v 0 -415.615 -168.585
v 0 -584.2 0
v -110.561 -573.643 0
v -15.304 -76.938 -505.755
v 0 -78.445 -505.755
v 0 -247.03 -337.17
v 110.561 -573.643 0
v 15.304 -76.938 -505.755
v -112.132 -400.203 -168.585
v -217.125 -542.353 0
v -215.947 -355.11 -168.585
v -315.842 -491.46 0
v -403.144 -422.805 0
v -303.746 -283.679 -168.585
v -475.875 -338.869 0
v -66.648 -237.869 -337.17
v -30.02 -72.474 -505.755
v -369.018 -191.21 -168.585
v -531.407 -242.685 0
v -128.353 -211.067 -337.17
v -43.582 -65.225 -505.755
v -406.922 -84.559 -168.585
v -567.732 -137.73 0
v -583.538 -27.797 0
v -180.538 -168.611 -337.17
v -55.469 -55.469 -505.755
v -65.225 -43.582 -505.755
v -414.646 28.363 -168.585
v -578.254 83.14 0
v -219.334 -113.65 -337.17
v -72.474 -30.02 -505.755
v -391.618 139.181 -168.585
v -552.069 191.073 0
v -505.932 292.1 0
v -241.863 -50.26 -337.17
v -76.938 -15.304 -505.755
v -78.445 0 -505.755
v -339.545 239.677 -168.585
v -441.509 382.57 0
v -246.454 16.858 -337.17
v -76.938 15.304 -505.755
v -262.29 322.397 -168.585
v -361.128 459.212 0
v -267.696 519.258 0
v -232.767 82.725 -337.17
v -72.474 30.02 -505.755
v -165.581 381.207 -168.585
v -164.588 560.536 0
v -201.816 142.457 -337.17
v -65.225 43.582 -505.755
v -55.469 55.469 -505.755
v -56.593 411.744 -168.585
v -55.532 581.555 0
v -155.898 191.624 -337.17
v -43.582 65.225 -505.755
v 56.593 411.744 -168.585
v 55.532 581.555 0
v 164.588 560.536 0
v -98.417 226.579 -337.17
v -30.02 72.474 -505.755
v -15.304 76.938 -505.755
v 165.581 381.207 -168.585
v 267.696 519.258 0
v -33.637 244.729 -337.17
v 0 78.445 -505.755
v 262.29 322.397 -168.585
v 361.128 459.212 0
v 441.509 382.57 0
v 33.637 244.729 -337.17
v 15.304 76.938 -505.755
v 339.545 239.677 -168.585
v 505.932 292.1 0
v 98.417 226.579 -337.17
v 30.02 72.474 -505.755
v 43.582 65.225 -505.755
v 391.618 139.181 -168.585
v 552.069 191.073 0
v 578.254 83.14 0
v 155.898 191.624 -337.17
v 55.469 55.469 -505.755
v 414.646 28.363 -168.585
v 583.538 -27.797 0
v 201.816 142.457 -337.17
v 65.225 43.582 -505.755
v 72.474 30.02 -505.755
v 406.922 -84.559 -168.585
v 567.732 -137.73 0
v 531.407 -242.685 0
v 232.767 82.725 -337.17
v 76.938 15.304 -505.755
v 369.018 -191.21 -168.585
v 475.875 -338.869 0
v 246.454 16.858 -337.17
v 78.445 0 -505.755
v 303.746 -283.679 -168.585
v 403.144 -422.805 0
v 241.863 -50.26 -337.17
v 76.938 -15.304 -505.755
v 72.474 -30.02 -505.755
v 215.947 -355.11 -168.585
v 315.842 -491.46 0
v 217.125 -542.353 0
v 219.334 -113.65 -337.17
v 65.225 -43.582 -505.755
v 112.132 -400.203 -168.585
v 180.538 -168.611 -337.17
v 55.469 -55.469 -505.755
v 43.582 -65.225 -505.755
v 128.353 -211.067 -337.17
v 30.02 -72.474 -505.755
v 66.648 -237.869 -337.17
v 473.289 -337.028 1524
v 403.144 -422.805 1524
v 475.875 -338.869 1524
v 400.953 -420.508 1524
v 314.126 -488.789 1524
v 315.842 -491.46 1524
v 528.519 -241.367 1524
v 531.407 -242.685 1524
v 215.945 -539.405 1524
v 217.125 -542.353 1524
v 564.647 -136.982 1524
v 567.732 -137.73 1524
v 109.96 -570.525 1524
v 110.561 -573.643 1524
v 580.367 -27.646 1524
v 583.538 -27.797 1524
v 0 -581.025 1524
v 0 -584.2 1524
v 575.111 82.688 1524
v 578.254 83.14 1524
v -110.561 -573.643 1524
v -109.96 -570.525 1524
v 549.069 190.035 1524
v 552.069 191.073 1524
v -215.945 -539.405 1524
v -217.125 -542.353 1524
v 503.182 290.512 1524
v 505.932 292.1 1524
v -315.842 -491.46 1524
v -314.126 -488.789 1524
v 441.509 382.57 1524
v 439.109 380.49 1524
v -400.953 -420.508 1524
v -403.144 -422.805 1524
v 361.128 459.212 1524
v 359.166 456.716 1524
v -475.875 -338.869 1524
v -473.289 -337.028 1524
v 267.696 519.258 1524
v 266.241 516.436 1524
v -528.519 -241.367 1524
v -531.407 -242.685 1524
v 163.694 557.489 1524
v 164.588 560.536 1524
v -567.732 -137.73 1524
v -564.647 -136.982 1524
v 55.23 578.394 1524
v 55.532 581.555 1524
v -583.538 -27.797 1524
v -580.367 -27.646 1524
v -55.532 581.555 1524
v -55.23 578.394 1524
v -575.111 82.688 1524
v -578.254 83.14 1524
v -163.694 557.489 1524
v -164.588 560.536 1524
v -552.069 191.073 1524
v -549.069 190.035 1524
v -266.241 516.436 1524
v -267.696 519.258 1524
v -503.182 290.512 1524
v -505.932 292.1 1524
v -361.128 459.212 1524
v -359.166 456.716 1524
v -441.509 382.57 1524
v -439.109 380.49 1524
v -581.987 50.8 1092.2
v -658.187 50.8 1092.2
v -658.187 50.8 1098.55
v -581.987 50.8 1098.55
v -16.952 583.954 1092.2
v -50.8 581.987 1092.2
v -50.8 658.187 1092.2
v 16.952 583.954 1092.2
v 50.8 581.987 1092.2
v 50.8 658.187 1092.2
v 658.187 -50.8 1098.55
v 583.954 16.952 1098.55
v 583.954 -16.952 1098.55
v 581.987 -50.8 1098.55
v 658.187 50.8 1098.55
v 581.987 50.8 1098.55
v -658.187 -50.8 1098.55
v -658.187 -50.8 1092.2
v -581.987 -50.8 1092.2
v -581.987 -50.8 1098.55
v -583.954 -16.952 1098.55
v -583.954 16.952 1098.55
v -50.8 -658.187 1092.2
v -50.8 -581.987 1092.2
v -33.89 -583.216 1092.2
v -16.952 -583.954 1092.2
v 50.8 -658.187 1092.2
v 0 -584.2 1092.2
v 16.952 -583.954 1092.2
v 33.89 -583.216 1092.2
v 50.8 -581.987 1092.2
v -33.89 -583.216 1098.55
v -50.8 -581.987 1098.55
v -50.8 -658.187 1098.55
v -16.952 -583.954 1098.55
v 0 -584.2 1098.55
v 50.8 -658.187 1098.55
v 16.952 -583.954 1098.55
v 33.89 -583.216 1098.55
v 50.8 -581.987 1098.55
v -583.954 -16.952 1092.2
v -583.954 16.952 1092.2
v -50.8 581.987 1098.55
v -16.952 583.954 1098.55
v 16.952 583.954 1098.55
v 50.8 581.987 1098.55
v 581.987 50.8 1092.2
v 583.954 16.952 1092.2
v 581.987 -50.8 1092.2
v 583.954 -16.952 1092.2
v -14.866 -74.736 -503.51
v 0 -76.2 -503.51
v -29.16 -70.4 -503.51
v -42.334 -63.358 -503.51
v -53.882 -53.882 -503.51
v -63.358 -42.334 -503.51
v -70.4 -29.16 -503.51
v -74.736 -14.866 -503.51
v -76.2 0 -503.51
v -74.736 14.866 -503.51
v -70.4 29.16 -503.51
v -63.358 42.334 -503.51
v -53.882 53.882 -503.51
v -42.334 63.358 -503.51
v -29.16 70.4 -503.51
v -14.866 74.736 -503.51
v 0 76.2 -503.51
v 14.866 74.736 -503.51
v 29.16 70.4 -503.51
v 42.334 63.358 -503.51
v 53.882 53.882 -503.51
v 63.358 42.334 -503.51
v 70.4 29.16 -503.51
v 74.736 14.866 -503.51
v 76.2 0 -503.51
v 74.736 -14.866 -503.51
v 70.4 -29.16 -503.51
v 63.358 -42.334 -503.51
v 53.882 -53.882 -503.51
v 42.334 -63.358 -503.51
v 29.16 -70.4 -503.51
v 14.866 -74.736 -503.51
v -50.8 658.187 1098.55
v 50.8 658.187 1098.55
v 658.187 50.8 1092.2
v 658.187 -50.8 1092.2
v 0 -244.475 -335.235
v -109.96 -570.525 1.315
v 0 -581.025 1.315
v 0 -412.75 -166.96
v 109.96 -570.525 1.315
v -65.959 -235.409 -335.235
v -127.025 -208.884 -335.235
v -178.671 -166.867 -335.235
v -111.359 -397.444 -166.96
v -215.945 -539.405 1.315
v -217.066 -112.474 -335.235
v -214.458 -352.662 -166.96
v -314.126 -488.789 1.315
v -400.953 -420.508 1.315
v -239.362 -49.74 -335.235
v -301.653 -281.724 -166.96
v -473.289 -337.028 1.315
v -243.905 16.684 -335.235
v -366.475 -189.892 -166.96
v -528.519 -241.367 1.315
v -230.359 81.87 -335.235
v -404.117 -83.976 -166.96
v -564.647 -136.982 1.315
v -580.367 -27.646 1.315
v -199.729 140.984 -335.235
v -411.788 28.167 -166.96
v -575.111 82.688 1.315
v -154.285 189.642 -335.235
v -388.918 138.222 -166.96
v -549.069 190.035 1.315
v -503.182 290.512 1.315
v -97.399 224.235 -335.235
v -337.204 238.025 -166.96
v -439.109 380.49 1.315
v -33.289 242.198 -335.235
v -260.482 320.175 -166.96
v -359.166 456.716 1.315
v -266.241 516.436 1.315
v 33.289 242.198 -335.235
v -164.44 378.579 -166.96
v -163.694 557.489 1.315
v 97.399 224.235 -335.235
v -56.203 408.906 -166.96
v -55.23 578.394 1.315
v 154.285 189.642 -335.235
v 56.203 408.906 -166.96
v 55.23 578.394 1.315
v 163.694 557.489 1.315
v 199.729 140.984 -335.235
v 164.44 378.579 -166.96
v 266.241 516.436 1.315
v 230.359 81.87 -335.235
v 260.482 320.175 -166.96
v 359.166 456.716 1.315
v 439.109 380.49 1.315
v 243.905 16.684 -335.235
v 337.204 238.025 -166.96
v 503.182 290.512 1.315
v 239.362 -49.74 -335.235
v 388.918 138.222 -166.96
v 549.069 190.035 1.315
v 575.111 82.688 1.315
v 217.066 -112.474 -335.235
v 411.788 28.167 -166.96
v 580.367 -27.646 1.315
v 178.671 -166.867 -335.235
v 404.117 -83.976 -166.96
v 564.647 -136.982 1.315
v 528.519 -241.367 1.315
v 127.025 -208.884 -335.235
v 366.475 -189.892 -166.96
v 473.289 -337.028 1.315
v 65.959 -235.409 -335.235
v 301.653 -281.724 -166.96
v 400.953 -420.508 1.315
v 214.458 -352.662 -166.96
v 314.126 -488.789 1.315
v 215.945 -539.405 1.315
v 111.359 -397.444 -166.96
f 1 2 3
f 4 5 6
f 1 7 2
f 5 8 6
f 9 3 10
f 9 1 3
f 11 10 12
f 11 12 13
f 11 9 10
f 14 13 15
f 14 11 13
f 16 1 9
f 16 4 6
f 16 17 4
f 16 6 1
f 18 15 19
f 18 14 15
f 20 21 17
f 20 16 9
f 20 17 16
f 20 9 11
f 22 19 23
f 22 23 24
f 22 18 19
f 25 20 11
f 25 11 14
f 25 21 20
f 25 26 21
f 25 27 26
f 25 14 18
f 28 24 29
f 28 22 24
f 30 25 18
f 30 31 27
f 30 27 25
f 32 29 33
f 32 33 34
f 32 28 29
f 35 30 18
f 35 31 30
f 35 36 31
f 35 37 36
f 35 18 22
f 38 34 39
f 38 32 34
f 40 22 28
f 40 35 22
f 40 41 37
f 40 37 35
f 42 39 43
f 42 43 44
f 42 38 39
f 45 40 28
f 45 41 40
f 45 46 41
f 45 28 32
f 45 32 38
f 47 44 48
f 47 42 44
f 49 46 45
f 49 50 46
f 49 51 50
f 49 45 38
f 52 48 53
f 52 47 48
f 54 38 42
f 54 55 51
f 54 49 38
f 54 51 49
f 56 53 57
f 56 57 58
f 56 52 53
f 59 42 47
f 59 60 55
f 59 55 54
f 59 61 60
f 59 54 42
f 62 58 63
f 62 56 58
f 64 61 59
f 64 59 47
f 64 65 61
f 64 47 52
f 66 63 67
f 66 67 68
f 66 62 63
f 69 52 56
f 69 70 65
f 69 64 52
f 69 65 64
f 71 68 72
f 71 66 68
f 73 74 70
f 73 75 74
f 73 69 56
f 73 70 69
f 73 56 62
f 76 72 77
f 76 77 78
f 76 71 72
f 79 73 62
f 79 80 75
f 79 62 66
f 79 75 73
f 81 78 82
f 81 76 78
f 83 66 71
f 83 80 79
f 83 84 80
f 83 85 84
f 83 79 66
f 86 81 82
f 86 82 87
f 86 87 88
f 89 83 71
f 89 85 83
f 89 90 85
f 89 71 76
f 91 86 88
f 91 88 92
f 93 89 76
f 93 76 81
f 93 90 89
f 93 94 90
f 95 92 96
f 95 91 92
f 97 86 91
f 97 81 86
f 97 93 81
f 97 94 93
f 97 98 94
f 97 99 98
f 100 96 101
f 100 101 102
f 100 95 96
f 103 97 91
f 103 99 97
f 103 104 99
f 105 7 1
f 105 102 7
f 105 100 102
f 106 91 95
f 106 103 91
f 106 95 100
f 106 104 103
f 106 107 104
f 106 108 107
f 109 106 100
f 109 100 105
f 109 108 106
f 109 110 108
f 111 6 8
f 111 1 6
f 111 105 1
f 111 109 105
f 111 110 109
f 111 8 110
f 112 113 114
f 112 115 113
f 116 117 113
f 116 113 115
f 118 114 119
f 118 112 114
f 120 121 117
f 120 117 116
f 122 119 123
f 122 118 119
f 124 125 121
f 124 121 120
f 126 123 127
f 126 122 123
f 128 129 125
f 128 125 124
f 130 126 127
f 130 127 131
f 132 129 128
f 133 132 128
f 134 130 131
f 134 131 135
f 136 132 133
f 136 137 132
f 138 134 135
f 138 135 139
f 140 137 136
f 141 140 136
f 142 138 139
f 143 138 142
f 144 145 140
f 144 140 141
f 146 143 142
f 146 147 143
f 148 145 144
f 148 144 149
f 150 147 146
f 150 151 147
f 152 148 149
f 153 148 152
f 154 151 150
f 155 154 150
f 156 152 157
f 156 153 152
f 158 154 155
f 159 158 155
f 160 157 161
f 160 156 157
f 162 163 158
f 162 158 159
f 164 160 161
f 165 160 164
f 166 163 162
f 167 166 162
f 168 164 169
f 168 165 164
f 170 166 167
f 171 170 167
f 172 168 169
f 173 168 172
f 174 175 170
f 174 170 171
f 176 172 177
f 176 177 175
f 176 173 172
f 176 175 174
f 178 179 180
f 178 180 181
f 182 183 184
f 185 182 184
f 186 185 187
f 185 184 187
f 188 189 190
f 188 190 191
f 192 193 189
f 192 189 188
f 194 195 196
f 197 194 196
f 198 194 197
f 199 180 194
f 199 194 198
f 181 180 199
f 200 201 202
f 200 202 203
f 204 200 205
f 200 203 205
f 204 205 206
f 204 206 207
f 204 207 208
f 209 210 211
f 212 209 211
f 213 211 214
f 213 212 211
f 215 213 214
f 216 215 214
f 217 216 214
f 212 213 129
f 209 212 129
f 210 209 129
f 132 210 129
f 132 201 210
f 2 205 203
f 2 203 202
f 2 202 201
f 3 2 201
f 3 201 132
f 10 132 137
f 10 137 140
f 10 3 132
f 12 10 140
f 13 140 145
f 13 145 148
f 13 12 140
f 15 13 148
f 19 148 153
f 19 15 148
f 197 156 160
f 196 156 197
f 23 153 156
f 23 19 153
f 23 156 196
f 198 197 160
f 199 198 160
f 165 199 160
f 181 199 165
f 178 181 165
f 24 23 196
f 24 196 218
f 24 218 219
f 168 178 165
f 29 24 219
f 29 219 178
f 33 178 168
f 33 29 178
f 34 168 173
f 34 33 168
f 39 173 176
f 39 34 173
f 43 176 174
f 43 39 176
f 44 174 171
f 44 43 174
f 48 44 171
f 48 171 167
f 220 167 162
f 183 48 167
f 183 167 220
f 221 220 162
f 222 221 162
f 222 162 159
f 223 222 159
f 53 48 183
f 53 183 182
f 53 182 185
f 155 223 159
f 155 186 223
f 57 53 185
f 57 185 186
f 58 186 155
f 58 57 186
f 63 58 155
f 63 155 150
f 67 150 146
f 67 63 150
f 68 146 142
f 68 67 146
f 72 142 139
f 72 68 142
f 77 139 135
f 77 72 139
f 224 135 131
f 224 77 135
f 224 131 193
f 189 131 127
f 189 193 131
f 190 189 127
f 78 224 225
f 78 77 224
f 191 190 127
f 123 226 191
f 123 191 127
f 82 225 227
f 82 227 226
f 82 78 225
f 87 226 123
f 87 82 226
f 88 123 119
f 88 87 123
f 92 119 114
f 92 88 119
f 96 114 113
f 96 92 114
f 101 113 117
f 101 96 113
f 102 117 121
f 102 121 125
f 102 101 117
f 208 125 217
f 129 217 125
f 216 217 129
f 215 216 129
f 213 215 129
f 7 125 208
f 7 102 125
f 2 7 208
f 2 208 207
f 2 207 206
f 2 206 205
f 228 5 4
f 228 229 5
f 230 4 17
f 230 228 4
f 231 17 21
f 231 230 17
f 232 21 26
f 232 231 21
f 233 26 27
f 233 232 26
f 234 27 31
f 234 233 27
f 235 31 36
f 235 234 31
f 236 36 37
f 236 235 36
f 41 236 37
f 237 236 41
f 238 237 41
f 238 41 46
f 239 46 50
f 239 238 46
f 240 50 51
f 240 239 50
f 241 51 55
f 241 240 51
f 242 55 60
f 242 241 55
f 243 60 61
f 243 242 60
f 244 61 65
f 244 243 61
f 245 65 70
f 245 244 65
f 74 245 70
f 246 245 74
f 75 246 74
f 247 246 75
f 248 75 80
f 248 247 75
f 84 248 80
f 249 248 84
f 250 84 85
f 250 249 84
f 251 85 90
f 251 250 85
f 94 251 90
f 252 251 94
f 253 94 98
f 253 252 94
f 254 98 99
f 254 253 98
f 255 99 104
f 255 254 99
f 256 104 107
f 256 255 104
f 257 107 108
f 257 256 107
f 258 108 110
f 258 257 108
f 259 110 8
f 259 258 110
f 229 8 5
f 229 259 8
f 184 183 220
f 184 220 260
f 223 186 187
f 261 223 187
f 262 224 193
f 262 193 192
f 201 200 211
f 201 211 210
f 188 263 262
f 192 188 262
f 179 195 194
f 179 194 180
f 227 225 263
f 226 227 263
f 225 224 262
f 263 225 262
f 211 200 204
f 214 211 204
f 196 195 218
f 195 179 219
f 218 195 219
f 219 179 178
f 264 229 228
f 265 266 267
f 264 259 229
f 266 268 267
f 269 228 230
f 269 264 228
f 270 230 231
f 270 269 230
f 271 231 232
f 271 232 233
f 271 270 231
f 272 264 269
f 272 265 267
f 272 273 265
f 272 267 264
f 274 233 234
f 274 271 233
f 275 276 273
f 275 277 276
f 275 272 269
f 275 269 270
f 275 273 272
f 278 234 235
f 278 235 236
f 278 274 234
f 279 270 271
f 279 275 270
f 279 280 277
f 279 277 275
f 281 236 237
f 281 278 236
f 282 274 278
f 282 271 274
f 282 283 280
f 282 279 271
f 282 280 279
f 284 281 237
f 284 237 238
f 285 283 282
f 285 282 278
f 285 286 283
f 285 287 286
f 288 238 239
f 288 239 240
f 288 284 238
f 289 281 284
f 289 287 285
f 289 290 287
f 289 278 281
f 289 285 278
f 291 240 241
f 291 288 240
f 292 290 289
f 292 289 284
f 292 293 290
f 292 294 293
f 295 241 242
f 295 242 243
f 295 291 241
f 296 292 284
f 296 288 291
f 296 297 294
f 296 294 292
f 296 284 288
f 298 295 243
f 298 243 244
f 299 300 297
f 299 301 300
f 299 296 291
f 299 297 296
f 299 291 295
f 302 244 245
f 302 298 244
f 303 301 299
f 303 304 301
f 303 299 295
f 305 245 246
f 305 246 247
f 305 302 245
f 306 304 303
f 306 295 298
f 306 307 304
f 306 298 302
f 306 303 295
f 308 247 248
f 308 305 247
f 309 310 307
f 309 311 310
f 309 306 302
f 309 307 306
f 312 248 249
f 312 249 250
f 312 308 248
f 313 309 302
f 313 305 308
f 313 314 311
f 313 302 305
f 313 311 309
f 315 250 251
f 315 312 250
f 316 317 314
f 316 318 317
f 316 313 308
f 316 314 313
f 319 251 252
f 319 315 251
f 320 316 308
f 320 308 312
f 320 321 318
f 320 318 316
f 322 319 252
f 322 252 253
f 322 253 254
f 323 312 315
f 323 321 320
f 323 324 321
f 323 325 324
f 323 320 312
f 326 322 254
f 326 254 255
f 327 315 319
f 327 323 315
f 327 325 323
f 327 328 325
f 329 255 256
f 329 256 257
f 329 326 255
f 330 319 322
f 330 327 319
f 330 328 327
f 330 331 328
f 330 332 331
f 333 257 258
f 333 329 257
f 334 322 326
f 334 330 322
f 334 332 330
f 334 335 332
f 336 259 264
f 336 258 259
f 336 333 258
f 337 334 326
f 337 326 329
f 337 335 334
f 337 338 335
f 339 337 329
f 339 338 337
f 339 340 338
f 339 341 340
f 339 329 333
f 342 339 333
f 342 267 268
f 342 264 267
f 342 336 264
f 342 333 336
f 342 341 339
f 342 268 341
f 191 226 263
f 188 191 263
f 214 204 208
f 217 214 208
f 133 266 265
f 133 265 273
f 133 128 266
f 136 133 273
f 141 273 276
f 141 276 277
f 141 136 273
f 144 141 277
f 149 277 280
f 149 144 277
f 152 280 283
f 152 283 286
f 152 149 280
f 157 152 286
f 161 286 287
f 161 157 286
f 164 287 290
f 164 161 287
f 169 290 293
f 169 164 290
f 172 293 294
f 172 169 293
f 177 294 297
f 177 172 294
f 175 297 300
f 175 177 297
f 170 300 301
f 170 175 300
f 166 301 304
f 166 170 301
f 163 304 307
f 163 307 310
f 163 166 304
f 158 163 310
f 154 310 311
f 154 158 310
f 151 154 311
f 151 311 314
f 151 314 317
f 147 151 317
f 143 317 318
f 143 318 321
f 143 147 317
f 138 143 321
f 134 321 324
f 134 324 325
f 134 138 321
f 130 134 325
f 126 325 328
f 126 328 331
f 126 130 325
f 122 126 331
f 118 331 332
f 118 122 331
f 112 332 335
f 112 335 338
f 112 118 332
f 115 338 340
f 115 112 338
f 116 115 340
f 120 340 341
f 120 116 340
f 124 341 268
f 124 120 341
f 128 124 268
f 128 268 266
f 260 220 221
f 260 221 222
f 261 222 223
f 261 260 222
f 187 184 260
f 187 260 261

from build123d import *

# Parameters (mm, degrees)
F3_W     = 101.6
F3_H     = 76.2
F3_W_2   = 76.2
F3_H_2   = 101.6
F4_DEPTH = 6.35


with BuildPart() as f1:
    # F0 (on Right) → F1 (revolve)
    with BuildSketch(Plane.YZ):
        Polygon((-581.025, 1524), (-584.2, 1524), (-584.2, 0), (-78.445064, -505.754936), (-76.2, -503.509872), (-581.025, 1.315128), align=None)
    revolve(axis=Axis((0, 0, 0), (0, 0, -1)))

    # F3 (on offset) → F4 (join)
    with BuildSketch(Plane.XY.offset(1092.2)):
        with Locations((0, 620.087113)):
            Rectangle(F3_W, F3_H)
        with Locations((-620.087113, 0)):
            Rectangle(F3_W_2, F3_H_2)
        with Locations((0, -620.087113)):
            Rectangle(F3_W, F3_H)
        with Locations((620.087113, 0)):
            Rectangle(F3_W_2, F3_H_2)
    extrude(amount=F4_DEPTH)


solid = f1.part
